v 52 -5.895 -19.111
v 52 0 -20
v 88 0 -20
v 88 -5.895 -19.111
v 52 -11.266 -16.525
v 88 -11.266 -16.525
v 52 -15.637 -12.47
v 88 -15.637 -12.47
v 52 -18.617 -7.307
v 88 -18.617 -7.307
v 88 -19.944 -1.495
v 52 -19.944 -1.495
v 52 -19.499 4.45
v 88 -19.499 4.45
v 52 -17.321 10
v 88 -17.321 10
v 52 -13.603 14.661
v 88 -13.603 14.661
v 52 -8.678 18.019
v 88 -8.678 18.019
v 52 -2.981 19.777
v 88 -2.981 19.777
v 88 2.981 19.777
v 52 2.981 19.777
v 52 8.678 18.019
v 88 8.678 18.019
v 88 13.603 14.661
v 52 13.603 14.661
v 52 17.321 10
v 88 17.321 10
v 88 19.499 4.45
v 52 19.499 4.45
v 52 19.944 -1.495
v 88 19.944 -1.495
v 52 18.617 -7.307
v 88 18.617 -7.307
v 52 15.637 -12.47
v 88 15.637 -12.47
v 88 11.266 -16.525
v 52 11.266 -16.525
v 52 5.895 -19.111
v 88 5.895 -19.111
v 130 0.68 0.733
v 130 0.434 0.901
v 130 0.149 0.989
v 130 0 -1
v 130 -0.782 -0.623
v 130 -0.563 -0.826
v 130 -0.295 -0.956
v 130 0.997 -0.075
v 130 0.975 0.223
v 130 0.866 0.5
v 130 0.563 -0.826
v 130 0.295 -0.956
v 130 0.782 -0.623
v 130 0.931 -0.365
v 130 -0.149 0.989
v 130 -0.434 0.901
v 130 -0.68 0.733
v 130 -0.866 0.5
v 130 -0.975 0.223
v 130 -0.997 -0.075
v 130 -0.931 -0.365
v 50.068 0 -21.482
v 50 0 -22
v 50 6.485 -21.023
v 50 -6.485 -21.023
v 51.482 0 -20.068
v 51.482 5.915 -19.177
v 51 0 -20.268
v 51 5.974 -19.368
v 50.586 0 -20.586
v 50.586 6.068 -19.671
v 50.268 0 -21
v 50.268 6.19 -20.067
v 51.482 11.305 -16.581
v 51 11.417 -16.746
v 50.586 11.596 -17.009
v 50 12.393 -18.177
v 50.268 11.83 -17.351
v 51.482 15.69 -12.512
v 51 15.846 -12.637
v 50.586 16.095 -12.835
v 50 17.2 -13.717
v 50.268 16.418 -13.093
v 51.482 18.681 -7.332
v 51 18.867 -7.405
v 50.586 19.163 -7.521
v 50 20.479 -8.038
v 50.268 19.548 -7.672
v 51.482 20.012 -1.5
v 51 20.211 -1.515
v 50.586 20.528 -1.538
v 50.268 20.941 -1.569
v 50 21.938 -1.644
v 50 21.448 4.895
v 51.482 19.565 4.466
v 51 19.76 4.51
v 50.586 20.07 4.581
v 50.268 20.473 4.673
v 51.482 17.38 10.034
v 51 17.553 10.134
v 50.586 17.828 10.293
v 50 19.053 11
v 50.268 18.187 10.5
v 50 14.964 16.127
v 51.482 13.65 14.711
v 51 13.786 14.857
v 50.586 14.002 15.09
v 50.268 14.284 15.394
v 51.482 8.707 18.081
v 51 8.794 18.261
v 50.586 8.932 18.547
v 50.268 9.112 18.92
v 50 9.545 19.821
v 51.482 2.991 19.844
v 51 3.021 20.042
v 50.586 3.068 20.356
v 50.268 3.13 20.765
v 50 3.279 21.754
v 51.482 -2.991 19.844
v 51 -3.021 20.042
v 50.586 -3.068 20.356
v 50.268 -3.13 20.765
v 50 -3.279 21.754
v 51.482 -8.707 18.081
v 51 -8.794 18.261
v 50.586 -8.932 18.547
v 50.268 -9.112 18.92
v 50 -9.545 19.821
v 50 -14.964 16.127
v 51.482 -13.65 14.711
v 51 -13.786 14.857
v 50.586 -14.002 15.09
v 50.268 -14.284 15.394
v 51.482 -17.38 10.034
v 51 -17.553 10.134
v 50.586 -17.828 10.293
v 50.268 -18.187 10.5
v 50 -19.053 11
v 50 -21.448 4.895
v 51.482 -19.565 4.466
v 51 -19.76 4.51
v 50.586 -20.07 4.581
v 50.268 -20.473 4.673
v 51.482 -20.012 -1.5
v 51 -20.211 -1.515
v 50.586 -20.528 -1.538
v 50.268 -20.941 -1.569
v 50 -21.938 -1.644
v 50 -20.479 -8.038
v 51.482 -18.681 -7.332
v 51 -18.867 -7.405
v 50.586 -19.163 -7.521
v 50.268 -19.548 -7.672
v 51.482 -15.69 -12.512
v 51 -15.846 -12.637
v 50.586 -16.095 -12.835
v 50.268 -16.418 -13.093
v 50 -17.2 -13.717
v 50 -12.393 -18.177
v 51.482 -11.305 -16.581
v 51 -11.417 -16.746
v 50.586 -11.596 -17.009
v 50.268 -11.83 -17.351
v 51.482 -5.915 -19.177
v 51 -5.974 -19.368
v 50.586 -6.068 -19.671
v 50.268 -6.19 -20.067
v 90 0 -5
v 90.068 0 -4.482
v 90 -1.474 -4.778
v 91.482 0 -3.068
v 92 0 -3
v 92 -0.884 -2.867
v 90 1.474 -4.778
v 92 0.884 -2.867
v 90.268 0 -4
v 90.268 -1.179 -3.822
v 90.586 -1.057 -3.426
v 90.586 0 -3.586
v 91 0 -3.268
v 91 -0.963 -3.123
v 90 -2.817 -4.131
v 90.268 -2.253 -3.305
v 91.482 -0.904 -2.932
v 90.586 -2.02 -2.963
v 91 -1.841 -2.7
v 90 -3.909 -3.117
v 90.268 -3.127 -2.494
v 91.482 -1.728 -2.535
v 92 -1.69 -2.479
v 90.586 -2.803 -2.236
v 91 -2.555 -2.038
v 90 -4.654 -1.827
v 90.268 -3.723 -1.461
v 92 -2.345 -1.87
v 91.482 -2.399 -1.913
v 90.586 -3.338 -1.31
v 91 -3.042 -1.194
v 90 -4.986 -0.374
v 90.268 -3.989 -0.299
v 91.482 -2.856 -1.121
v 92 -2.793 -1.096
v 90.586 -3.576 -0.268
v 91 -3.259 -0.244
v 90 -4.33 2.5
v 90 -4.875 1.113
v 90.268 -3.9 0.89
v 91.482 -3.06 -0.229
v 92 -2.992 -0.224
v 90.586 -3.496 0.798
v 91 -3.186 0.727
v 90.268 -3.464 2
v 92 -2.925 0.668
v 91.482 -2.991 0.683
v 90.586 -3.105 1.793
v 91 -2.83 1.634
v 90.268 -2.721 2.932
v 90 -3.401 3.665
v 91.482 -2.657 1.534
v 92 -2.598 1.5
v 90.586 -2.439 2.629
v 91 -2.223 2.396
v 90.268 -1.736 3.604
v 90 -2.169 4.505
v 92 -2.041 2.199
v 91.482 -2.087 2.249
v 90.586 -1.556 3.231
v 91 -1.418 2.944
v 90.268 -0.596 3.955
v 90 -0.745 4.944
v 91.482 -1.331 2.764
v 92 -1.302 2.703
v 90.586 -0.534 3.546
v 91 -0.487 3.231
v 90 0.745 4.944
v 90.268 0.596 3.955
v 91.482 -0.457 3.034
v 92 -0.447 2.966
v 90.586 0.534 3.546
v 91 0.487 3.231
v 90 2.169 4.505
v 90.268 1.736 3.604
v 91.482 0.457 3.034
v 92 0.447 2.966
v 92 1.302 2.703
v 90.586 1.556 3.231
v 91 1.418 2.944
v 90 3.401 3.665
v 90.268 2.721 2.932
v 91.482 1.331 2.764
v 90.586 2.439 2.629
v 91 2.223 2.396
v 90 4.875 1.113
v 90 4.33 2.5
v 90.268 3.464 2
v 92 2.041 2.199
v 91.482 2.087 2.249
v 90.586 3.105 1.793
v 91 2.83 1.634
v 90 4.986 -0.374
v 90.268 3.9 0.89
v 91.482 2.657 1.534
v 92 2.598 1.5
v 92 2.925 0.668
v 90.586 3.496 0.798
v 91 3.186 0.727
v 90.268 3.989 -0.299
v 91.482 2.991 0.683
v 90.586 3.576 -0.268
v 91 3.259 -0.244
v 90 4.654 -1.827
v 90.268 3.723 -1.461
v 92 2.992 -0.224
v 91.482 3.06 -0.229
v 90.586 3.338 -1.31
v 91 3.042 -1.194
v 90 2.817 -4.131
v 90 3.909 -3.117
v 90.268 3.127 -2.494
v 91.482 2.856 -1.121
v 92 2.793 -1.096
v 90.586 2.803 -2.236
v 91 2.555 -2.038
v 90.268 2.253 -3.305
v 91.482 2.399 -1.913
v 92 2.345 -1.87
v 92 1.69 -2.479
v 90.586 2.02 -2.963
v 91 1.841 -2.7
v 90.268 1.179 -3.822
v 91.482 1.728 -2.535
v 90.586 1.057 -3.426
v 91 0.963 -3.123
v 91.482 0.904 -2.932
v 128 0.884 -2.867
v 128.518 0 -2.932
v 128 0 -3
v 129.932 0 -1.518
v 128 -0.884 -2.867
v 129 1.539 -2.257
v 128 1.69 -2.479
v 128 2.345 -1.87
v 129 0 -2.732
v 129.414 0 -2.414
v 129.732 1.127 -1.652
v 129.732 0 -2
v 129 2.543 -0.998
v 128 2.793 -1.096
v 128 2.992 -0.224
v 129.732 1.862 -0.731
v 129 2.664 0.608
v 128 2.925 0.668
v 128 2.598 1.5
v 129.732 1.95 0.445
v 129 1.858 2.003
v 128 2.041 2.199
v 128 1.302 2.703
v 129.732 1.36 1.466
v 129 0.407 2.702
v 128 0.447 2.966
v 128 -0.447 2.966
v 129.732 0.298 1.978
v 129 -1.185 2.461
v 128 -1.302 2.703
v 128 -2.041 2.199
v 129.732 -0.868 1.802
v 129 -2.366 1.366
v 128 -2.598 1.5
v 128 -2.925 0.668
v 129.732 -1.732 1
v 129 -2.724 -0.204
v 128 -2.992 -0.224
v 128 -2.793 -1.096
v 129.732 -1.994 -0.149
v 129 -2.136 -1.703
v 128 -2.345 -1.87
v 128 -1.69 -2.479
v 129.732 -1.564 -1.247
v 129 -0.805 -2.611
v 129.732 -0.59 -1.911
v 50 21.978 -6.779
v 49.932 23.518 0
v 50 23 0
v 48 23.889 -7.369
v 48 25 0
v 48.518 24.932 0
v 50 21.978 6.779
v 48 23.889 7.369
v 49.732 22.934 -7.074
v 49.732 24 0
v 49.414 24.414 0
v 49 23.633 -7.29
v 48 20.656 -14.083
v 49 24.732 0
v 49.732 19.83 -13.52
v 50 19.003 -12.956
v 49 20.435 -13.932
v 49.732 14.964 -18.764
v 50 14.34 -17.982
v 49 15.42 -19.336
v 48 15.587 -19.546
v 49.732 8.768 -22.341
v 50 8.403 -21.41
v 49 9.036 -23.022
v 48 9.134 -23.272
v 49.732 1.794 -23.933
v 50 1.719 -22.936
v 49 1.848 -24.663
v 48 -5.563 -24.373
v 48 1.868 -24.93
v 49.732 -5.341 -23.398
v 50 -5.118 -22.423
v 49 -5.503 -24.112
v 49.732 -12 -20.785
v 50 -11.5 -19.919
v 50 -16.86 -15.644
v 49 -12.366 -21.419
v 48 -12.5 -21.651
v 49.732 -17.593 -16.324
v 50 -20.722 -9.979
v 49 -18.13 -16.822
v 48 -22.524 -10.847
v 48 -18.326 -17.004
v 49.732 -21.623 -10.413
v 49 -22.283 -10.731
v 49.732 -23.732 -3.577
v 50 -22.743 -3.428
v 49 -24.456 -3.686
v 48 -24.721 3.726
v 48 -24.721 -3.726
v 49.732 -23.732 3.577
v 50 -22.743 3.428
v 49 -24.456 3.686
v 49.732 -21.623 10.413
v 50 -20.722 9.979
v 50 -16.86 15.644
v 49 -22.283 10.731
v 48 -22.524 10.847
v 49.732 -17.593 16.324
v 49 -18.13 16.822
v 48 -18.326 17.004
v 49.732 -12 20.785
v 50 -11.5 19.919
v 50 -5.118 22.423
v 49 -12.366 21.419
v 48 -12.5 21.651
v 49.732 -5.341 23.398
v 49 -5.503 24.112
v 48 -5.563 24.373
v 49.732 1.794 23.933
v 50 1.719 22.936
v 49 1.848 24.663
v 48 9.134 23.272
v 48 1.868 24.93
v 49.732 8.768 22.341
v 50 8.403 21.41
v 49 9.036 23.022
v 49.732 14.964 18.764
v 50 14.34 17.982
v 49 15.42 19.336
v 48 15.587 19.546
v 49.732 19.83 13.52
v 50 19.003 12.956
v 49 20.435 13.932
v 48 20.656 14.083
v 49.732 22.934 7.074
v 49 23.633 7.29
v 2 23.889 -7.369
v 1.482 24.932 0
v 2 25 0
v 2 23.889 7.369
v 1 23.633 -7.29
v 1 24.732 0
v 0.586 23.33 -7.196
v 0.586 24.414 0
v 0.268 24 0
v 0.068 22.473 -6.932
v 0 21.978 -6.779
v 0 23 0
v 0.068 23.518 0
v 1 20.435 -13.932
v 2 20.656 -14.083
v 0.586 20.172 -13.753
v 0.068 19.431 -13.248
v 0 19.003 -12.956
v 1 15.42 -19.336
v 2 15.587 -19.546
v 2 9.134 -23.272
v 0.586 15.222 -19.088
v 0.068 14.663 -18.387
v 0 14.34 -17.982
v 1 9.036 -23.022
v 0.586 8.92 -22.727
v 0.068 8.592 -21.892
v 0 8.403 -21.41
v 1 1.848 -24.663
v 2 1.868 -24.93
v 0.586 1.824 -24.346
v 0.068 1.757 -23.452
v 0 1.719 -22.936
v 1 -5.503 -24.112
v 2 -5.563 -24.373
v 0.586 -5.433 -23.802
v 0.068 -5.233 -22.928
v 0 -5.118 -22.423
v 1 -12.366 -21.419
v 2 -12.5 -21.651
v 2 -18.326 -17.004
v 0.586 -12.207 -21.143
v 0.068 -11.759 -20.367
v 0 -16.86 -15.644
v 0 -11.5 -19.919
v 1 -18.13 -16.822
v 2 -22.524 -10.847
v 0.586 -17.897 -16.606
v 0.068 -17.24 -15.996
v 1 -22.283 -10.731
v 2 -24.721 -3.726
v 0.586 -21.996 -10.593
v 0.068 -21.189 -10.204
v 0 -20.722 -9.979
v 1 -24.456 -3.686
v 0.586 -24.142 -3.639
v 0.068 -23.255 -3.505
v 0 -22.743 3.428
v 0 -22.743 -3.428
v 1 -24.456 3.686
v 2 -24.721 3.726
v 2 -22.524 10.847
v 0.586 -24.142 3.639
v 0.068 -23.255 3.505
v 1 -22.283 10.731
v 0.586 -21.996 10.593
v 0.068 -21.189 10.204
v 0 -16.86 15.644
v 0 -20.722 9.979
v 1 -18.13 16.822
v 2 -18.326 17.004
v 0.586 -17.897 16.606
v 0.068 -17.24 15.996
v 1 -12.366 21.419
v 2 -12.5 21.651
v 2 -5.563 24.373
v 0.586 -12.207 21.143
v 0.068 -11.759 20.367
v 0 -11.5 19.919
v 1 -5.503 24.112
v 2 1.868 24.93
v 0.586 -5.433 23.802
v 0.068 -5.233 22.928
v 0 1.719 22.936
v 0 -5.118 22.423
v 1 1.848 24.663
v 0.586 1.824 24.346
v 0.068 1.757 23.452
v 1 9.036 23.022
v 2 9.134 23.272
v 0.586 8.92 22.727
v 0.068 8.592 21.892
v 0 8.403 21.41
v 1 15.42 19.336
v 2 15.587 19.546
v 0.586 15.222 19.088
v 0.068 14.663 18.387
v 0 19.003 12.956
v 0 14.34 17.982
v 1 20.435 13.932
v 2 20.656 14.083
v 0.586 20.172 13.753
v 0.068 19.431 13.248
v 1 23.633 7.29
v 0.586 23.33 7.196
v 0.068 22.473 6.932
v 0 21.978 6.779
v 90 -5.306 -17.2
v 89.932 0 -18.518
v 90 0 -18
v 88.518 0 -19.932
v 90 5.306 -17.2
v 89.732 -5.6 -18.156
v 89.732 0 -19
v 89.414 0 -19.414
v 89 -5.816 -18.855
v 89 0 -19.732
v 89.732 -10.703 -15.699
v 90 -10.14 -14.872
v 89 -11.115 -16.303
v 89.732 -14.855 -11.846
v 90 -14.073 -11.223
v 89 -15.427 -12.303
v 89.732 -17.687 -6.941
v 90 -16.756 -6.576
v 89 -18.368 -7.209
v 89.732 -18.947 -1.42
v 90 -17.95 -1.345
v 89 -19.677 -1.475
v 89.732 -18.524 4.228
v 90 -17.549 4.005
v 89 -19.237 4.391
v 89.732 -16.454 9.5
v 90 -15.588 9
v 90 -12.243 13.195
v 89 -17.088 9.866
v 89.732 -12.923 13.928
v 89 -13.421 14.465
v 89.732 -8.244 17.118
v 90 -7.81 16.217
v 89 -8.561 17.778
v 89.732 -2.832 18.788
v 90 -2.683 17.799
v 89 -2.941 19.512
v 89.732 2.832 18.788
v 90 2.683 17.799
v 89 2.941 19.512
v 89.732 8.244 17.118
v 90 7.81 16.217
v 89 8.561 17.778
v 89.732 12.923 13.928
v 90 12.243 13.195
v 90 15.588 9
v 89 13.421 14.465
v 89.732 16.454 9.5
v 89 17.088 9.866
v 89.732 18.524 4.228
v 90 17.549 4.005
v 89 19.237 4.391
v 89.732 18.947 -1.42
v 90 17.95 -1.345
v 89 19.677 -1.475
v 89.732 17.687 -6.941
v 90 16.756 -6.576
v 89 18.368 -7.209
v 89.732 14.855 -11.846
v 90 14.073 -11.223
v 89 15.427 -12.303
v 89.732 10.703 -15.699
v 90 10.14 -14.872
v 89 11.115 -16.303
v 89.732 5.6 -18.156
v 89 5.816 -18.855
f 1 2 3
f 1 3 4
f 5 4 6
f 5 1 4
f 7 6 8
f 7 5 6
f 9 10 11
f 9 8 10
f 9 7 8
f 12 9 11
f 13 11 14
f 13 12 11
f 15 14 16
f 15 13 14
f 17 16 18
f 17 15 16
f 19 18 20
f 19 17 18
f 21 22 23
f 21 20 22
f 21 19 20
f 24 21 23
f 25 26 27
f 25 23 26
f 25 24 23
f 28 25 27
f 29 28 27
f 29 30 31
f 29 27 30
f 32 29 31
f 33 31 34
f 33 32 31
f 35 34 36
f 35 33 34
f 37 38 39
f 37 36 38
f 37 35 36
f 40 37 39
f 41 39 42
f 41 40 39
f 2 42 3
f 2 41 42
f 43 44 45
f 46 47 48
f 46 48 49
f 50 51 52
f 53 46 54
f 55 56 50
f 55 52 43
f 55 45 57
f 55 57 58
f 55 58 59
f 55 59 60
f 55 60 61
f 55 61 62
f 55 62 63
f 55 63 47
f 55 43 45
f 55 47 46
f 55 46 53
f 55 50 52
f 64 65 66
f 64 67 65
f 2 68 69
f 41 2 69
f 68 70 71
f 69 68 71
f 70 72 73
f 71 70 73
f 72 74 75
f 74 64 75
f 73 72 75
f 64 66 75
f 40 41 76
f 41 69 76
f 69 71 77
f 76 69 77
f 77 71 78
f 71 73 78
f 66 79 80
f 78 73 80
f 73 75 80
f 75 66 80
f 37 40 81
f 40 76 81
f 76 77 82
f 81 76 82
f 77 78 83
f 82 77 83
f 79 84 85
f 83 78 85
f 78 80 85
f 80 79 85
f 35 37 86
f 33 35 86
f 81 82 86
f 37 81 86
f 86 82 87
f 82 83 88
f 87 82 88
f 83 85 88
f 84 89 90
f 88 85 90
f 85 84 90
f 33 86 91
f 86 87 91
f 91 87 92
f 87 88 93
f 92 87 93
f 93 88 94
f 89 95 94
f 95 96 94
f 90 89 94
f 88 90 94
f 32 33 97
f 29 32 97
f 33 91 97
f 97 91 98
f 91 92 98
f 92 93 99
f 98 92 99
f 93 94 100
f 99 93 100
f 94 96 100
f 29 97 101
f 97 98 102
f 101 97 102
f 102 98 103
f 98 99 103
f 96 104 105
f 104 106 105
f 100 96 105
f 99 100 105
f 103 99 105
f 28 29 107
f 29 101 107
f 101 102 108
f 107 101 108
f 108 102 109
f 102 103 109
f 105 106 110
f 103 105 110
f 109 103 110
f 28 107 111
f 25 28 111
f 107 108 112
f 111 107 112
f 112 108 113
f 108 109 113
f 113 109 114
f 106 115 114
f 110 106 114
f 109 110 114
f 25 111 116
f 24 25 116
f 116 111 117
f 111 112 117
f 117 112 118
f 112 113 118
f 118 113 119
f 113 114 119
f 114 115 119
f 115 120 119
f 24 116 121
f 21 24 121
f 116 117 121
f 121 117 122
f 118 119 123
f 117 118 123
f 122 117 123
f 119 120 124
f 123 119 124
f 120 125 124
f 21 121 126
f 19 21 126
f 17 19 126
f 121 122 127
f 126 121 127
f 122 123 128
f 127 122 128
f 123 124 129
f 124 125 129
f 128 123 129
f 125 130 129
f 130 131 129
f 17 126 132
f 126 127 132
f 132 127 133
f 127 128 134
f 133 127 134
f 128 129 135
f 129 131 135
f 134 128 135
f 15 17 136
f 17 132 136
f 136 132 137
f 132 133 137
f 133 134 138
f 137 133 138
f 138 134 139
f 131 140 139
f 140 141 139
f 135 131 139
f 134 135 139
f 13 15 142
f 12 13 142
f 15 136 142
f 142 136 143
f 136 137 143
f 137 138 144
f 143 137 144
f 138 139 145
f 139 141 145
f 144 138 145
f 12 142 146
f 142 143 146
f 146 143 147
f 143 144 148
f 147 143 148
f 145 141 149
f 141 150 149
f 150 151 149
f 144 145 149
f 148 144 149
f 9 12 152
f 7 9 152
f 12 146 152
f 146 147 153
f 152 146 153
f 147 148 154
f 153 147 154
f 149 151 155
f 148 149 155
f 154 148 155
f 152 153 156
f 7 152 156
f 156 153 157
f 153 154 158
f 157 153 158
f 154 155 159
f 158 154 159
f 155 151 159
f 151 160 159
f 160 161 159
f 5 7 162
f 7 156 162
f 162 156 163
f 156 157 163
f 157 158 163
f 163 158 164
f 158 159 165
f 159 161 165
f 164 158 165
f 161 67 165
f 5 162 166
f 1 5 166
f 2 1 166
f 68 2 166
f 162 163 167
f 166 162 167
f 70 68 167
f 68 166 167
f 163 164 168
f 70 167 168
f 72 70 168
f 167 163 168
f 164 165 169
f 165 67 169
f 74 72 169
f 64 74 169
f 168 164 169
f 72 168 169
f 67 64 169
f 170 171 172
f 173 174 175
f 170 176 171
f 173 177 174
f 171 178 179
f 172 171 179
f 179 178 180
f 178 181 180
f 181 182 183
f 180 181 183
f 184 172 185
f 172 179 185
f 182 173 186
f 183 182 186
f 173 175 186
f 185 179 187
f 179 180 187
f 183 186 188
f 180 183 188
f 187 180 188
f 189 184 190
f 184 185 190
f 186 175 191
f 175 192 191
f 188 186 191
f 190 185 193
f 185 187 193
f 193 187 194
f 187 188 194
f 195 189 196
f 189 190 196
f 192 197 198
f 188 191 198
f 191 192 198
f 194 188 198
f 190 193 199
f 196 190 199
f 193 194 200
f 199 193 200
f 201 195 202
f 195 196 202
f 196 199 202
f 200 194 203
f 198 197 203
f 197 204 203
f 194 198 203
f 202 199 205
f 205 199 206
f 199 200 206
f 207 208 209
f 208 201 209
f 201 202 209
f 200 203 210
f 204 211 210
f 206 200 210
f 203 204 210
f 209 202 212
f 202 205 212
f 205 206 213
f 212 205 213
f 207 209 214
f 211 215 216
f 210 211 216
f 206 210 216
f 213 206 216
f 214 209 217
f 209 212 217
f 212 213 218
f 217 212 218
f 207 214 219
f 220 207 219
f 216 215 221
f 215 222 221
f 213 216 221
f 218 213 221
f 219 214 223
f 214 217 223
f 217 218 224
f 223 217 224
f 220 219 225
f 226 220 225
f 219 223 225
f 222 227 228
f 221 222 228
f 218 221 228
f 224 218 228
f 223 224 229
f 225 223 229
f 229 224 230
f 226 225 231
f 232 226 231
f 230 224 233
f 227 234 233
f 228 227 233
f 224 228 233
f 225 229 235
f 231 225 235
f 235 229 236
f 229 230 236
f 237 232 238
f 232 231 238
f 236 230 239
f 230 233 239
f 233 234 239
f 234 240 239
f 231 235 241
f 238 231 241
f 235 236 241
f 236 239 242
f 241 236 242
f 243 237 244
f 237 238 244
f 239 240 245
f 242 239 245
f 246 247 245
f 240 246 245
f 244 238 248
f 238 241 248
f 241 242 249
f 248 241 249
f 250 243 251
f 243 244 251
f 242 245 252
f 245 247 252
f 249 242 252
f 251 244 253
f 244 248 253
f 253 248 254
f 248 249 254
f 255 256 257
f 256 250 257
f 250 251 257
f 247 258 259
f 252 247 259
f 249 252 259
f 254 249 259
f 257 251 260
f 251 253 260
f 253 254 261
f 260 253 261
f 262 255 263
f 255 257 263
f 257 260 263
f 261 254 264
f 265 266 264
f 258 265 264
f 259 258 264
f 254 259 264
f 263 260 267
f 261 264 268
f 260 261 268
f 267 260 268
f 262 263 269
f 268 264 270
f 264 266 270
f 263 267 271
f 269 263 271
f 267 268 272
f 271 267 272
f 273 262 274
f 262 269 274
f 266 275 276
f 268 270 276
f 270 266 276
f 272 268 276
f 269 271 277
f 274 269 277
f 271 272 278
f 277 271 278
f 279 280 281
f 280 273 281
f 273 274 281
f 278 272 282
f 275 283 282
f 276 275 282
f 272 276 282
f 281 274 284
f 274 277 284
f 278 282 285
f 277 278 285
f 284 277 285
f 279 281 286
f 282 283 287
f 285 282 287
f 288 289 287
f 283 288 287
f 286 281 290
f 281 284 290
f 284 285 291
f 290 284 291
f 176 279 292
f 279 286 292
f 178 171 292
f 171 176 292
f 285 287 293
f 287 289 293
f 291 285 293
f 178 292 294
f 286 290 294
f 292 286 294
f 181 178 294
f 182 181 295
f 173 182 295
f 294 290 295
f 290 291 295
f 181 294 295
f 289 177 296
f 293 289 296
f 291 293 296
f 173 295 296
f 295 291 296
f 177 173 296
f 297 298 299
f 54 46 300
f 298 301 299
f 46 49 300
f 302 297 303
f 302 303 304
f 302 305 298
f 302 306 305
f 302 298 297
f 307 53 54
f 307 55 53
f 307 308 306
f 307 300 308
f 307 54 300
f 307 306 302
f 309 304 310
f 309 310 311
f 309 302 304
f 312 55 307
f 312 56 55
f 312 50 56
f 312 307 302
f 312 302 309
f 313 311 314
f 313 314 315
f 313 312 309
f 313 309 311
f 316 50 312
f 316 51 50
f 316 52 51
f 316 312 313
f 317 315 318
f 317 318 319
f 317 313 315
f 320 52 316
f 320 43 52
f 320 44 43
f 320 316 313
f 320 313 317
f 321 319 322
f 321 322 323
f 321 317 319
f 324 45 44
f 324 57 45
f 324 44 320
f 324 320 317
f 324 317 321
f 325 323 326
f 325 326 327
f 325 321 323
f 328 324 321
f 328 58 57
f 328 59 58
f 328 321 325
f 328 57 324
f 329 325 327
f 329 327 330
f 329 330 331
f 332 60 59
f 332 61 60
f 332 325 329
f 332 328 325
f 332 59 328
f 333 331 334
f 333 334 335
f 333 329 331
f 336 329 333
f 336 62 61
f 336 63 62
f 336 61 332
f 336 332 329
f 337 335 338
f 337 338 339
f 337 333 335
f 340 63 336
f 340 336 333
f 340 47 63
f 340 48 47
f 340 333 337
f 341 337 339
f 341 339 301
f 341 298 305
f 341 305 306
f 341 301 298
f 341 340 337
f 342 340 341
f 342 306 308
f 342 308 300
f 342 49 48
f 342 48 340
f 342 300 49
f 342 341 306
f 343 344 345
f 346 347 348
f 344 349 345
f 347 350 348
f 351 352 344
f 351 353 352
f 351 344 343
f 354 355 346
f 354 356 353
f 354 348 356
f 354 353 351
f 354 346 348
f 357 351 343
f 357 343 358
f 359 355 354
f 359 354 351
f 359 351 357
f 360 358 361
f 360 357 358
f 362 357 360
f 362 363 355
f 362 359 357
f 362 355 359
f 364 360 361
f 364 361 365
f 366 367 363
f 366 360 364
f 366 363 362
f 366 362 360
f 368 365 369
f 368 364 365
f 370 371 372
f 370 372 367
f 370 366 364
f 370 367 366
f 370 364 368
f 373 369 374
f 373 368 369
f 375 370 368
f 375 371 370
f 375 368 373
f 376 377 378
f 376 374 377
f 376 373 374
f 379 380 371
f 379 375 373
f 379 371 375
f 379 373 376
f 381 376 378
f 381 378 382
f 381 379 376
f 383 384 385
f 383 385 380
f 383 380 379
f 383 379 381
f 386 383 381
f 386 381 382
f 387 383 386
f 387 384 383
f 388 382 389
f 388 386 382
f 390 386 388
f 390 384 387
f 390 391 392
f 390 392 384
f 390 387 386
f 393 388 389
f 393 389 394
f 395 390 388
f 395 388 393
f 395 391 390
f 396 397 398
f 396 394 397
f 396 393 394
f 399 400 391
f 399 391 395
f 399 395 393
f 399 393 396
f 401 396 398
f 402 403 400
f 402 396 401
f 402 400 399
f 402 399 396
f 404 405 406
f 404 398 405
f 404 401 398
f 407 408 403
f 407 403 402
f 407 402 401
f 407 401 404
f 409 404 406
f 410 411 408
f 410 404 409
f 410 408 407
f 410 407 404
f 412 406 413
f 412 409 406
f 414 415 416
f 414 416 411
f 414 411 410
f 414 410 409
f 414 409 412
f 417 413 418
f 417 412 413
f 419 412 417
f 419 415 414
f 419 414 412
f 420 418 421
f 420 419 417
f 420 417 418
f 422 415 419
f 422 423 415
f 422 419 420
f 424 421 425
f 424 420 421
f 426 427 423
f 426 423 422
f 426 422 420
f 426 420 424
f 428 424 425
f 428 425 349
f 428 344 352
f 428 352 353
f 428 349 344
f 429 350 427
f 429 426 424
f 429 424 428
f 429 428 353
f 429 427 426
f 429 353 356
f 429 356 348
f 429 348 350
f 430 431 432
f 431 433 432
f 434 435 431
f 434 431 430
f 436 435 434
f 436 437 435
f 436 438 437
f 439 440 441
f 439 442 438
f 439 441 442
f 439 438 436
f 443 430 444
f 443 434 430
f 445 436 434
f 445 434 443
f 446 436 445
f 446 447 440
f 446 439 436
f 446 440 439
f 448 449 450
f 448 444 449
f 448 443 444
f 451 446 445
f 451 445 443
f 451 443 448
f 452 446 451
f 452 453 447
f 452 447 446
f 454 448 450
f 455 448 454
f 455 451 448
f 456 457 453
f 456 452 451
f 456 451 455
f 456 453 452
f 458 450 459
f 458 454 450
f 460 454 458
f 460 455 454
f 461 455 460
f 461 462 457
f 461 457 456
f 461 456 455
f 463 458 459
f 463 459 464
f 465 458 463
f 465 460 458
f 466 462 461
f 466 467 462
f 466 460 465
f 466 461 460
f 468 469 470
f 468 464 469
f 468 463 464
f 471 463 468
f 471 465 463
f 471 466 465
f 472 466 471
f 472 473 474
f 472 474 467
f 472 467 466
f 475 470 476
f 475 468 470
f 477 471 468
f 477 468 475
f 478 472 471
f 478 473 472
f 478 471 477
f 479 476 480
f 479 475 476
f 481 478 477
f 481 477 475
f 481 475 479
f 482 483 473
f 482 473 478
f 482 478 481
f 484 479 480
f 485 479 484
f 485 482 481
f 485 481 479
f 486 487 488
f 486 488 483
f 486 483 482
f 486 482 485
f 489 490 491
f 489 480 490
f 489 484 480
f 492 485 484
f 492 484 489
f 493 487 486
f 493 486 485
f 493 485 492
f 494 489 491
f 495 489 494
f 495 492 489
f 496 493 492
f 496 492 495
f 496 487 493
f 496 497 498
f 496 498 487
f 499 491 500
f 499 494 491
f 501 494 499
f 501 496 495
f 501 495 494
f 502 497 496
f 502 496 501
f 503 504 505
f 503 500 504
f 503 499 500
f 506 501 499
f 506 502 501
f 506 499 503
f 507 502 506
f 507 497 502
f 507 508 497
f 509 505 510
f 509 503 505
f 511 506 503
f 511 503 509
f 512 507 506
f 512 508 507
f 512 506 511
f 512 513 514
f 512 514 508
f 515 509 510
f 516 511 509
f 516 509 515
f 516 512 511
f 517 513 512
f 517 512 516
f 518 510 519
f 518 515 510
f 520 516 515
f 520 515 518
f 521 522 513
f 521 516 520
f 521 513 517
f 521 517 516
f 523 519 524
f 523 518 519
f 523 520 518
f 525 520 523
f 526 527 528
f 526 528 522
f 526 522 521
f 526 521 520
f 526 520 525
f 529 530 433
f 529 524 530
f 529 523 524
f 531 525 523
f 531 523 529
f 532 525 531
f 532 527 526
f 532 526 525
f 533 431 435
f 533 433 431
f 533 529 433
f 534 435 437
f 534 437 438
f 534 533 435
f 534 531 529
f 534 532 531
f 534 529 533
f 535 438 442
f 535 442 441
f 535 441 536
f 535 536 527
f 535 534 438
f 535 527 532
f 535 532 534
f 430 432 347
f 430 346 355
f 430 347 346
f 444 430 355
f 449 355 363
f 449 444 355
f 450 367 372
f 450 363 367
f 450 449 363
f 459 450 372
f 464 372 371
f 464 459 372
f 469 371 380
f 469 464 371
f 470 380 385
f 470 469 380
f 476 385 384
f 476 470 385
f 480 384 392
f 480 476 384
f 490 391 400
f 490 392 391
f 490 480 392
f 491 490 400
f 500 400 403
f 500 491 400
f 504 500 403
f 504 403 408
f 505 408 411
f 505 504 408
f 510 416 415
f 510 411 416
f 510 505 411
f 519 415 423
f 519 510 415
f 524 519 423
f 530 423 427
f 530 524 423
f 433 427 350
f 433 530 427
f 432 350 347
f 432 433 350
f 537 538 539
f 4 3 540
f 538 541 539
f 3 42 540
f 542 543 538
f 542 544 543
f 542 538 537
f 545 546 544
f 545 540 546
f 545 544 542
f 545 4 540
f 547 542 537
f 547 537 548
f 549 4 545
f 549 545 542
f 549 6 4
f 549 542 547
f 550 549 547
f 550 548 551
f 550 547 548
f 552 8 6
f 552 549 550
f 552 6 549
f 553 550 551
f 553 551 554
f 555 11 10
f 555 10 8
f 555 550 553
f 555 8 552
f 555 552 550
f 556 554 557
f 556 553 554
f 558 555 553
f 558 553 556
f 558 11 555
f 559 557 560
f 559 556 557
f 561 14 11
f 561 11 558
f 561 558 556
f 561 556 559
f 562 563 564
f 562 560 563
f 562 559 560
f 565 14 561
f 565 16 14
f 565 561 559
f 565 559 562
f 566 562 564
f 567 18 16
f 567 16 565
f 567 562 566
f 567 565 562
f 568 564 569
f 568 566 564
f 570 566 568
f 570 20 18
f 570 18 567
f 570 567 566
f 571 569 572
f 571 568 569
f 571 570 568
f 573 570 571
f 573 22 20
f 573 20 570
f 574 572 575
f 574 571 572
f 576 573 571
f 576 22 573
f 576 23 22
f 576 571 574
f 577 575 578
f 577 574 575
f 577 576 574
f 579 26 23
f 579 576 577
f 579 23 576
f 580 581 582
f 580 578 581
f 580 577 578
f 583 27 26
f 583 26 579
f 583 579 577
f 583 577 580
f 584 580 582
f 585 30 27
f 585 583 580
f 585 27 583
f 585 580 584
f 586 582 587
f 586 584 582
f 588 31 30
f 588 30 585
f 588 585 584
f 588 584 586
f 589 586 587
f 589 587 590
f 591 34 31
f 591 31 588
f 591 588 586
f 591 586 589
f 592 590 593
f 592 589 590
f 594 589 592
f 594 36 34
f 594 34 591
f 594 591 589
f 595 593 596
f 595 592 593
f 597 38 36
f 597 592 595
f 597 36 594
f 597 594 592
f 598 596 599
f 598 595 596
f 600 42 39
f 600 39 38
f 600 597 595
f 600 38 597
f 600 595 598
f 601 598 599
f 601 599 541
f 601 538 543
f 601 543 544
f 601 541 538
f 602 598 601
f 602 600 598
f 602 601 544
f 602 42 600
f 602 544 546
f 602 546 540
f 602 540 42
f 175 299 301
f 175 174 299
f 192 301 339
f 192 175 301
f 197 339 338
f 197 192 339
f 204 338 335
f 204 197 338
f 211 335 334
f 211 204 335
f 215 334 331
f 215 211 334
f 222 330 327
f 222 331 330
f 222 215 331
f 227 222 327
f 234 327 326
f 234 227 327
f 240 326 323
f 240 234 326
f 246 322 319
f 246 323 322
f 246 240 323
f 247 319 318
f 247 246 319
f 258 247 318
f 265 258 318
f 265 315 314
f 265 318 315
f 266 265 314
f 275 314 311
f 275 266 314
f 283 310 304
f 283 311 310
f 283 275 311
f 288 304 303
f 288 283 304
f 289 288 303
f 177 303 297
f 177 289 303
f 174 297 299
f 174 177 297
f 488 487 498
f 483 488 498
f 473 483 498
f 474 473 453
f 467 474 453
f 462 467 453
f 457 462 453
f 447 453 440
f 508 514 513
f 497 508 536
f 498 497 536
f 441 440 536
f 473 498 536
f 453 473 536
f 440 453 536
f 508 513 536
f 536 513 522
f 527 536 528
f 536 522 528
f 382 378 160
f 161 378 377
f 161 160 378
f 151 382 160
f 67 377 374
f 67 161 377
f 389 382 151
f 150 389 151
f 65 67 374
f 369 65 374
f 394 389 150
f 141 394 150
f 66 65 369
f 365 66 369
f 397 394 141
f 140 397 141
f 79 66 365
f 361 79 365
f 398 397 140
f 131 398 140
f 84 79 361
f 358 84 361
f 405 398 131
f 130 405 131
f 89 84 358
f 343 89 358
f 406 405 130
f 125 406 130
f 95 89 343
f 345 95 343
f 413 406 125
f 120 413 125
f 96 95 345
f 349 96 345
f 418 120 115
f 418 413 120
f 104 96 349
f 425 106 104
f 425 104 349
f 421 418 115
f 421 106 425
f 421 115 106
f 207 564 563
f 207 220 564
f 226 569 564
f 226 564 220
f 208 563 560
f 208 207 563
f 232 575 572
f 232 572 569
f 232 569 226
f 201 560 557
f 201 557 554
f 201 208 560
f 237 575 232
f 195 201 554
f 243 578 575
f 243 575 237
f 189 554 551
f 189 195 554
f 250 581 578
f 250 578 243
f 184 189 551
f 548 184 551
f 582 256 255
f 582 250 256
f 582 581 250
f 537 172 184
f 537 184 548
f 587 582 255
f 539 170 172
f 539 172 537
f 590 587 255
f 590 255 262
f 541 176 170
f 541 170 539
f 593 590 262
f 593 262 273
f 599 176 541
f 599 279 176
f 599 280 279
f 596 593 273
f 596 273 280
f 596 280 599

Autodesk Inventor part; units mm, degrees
ref_plane "YZ Plane" through (0, 0, 0) normal (1, 0, 0) x (0, 1, 0)
ref_plane "XZ Plane" through (0, 0, 0) normal (0, 1, 0) x (-1, 0, 0)
ref_plane "XY Plane" through (0, 0, 0) normal (0, 0, 1) x (1, 0, 0)
sketch "草图1" plane through (0, 0, 0) normal (1, 0, 0) x (0, 1, 0)
  circle A0 centre (0, 0) radius 25
  dimension "d0" = 50
extrude "拉伸1" add sketch "草图1" along normal blind 50
sketch "草图2" plane through (50, 0, 0) normal (1, 0, 0) x (0, 0, -1)
  circle A0 centre (0, 0) radius 20
  dimension "d3" = 40
extrude "拉伸2" add sketch "草图2" along normal blind 40
sketch "草图3" plane through (90, 0, 0) normal (1, 0, 0) x (0, 0, -1)
  circle A0 centre (0, 0) radius 3
  dimension "d6" = 6
extrude "拉伸3" add sketch "草图3" along normal blind 40
fillet "圆角1" radius 2 1 edges at (130, 0, 3)
fillet "圆角2" radius 2 1 edges at (90, 0, 20)
fillet "圆角3" radius 2 2 edges at (50, -25, 0) (0, -25, 0)
fillet "圆角3" radius 2 2 edges at (90, 0, 3) (50, 0, 20)
properties part number "马达"
